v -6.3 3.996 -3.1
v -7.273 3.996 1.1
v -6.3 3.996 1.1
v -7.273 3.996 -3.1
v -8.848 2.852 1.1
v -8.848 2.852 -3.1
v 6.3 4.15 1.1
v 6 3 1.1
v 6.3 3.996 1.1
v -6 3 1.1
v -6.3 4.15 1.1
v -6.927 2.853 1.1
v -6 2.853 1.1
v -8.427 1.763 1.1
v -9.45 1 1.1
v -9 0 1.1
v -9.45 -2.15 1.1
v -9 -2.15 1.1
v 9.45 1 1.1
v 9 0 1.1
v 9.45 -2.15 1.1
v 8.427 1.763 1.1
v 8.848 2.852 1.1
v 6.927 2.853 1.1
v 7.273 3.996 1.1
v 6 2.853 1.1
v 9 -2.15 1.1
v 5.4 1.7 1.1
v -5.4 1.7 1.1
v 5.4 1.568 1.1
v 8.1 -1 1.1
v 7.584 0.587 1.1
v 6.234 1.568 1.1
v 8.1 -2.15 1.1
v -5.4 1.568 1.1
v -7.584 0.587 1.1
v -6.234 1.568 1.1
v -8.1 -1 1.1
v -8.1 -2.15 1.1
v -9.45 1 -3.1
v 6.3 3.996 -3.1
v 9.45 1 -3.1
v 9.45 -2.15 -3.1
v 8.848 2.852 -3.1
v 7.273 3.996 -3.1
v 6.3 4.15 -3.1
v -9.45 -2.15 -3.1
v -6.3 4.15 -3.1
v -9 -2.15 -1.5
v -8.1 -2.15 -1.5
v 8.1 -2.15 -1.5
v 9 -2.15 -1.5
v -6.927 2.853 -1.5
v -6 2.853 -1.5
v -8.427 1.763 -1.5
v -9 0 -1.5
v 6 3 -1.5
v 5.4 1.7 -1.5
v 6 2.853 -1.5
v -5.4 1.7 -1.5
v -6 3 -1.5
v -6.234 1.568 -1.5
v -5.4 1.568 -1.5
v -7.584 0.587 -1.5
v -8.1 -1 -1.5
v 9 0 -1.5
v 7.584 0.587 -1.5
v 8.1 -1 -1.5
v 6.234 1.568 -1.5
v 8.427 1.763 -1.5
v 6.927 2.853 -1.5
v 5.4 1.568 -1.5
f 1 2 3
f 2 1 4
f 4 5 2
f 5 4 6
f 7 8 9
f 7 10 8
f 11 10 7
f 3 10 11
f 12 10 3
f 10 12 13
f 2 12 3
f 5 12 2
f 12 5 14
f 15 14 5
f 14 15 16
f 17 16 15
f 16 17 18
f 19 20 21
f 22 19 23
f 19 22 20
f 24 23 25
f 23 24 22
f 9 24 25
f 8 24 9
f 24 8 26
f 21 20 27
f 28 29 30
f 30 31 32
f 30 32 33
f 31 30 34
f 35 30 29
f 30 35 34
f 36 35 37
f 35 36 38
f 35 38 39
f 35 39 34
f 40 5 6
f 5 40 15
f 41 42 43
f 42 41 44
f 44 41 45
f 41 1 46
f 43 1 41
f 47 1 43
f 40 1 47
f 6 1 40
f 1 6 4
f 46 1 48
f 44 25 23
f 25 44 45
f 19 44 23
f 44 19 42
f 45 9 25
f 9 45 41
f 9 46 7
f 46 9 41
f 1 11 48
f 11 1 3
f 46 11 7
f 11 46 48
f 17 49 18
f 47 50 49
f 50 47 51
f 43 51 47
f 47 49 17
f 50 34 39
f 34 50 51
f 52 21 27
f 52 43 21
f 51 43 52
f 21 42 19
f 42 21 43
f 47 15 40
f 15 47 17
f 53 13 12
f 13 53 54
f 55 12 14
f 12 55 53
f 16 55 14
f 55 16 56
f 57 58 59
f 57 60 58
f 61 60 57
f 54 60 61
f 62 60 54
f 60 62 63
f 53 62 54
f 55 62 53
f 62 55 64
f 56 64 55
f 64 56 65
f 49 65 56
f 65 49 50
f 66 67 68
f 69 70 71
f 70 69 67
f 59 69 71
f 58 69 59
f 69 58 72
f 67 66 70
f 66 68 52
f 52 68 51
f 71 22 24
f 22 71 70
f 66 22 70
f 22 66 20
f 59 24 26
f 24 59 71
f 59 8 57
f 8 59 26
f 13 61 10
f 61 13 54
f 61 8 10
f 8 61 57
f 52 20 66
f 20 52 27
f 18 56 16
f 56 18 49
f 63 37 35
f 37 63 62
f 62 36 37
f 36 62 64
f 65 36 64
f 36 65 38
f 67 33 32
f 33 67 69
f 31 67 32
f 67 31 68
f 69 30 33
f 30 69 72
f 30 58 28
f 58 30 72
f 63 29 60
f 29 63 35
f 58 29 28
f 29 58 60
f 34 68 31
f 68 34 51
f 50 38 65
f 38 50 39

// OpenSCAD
module main_shape(height){
union() {
    translate([-6,0,0]) cylinder(height,3,3,true);
    translate([6,0,0]) cylinder(height,3,3,true);
    translate([0,0,0])cube([12,6,height],true);
    translate([0,-1.5,0]) cube([18,3,height],true);
}
}


difference() {
    translate([0,1,-1.0]) scale(1.05) main_shape(4);
    difference() {
        main_shape(3);
        translate([0,-1,0]) color("green") scale([0.9,0.90,2])main_shape(6);
   
    }
  }
